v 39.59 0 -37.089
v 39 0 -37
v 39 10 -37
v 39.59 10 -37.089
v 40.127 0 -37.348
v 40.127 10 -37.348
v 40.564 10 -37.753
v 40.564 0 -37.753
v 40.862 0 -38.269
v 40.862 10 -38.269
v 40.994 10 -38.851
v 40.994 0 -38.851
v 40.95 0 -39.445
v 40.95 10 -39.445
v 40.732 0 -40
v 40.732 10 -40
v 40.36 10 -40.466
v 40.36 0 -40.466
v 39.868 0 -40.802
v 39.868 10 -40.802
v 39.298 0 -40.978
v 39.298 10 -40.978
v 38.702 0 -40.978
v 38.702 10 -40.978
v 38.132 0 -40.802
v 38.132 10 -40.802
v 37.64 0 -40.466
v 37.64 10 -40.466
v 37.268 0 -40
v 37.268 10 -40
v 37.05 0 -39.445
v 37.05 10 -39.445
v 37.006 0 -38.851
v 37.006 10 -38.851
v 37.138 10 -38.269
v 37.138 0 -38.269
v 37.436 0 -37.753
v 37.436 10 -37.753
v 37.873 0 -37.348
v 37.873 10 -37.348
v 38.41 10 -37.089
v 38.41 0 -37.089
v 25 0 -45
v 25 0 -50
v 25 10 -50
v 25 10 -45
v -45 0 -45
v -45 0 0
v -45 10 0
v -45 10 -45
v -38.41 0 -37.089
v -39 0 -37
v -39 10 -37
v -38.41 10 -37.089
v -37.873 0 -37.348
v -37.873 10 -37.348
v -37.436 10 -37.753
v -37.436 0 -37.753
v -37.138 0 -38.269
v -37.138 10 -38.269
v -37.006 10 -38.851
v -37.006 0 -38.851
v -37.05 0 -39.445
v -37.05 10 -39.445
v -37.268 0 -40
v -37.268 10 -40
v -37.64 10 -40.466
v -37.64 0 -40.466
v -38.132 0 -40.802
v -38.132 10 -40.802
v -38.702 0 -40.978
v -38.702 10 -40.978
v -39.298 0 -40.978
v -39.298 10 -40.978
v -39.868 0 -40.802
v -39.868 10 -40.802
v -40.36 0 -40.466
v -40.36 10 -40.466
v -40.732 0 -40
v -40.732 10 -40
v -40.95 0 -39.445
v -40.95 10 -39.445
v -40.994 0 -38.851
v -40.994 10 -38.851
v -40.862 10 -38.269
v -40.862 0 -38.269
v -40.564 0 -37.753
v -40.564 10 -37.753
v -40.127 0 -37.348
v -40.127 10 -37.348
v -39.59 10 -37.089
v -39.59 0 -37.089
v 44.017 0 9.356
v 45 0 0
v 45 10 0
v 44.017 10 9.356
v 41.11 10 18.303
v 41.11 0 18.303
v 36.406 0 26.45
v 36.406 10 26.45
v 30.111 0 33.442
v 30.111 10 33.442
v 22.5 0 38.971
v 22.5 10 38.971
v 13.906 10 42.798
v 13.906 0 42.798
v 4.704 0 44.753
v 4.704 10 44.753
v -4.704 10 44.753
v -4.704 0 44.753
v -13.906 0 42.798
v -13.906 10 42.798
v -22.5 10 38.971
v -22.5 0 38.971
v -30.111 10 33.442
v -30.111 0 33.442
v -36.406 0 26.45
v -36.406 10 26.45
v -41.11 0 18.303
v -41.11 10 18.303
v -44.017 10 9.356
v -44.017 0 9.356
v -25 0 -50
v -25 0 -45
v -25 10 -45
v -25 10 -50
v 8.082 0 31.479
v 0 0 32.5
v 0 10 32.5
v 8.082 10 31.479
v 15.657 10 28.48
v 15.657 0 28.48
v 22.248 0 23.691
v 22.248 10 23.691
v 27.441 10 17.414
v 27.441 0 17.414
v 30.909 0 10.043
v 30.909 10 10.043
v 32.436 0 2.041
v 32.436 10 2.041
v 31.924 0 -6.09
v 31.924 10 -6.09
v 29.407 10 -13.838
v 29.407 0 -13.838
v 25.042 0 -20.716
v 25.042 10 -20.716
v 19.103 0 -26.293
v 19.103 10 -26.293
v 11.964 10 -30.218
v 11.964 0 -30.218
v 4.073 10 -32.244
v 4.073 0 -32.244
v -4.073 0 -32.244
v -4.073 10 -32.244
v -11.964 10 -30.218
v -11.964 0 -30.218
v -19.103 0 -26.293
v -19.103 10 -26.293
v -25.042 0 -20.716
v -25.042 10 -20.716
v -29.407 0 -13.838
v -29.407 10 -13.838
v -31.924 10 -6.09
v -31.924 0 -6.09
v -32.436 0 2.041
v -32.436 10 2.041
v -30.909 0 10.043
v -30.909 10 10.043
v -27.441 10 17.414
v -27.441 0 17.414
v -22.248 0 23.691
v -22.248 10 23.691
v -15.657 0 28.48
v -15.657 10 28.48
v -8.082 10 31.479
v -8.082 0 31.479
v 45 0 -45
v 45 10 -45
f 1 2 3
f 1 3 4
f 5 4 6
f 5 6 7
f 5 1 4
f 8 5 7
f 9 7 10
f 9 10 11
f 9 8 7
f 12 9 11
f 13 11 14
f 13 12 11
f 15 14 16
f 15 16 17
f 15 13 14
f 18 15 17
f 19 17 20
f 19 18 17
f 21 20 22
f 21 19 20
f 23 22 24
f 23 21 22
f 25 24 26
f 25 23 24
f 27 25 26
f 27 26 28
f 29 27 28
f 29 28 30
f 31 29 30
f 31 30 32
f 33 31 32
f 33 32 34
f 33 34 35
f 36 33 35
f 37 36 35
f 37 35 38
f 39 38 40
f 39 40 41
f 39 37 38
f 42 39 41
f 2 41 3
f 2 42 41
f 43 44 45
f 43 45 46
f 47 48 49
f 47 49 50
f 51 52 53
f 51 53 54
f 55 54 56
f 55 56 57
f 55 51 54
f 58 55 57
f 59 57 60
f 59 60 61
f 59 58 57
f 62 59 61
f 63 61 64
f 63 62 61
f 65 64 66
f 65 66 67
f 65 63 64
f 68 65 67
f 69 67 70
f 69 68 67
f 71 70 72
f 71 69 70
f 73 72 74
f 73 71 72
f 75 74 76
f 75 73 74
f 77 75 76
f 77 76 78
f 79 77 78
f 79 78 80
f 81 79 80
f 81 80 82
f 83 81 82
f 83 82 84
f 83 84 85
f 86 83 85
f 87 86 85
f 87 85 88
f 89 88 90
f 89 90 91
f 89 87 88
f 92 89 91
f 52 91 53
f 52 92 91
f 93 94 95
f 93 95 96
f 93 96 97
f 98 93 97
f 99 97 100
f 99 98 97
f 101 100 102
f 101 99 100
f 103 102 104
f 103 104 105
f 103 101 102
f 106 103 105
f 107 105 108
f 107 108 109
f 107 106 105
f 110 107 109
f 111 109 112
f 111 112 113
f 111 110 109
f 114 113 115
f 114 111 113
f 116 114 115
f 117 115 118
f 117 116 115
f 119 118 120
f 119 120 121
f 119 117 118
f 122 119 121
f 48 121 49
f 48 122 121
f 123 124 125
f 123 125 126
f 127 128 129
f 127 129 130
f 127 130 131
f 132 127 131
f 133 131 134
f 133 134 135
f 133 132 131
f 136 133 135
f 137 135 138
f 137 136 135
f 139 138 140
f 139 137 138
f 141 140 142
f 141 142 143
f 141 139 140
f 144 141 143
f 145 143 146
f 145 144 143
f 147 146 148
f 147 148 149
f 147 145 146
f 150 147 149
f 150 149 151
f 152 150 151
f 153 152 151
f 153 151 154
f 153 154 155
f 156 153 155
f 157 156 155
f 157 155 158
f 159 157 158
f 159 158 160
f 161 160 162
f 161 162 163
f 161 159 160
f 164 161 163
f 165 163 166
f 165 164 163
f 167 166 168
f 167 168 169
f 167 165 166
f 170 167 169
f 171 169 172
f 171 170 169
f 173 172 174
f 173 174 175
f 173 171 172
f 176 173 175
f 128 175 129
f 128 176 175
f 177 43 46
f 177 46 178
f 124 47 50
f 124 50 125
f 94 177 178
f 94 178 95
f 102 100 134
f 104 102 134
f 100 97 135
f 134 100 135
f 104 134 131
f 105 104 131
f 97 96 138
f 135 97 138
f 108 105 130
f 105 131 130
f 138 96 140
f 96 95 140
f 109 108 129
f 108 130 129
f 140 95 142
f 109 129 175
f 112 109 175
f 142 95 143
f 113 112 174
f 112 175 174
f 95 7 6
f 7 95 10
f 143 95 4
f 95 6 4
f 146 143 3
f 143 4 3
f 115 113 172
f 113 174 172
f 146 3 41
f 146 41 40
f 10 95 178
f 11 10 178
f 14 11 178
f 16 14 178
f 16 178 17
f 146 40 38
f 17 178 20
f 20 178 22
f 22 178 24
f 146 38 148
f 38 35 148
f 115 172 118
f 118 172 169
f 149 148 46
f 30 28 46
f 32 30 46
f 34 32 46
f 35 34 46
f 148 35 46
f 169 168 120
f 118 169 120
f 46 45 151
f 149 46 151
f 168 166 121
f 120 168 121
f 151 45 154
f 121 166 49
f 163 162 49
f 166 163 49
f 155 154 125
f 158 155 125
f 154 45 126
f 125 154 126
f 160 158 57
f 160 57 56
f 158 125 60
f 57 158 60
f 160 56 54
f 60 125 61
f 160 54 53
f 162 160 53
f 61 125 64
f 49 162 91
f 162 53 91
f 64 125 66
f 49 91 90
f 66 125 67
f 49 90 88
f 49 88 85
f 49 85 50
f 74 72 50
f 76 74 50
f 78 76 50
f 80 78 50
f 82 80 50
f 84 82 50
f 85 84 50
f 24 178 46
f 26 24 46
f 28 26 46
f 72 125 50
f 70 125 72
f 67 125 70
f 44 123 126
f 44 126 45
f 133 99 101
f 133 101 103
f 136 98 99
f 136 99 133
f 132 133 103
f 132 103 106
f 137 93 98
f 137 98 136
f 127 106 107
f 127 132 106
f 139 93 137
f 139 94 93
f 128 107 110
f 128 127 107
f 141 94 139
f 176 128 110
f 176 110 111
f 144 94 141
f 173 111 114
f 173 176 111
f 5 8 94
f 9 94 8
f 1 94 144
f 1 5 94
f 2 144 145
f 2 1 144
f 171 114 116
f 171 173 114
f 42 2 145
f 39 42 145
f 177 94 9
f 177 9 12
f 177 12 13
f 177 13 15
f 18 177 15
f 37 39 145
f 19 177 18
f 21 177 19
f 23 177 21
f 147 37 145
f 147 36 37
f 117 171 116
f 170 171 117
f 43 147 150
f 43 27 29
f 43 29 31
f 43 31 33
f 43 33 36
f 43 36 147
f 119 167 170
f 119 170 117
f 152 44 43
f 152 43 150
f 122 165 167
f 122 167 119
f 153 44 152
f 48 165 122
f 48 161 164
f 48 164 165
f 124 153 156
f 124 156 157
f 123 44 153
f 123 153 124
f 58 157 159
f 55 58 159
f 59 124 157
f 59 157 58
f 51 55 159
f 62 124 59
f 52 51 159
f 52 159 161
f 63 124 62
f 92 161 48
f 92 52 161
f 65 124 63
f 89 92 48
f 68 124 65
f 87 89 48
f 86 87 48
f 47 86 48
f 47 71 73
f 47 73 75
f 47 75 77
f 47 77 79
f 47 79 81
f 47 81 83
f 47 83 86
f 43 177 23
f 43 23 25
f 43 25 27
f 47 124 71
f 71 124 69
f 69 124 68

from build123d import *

# Parameters (mm, degrees)
SKETCH_1_R      = 32.5
SKETCH_1_R_2    = 2
EXTRUDE_1_DEPTH = 10


with BuildPart() as part:
    # 스케치1 → 보스-돌출1 (new body)
    with BuildSketch(Plane(origin=(0, 0, 0), x_dir=(1, 0, 0), z_dir=(0, 1, 0))):
        with BuildLine():
            Line((-25, 45), (-25, 50))
            Line((-25, 50), (25, 50))
            Line((25, 50), (25, 45))
            Line((25, 45), (45, 45))
            Line((45, 45), (45, 0))
            ThreePointArc((45, 0), (0, -45), (-45, 0))
            Line((-45, 0), (-45, 45))
            Line((-45, 45), (-25, 45))
        make_face()
        with Locations(Location((0, 0, 0), (0, 0, 270))):
            Circle(SKETCH_1_R, mode=Mode.SUBTRACT)
        with Locations(Location((-39, 39, 0), (0, 0, 270))):
            Circle(SKETCH_1_R_2, mode=Mode.SUBTRACT)
        with Locations(Location((39, 39, 0), (0, 0, 270))):
            Circle(SKETCH_1_R_2, mode=Mode.SUBTRACT)
    extrude(amount=EXTRUDE_1_DEPTH)


solid = part.part
